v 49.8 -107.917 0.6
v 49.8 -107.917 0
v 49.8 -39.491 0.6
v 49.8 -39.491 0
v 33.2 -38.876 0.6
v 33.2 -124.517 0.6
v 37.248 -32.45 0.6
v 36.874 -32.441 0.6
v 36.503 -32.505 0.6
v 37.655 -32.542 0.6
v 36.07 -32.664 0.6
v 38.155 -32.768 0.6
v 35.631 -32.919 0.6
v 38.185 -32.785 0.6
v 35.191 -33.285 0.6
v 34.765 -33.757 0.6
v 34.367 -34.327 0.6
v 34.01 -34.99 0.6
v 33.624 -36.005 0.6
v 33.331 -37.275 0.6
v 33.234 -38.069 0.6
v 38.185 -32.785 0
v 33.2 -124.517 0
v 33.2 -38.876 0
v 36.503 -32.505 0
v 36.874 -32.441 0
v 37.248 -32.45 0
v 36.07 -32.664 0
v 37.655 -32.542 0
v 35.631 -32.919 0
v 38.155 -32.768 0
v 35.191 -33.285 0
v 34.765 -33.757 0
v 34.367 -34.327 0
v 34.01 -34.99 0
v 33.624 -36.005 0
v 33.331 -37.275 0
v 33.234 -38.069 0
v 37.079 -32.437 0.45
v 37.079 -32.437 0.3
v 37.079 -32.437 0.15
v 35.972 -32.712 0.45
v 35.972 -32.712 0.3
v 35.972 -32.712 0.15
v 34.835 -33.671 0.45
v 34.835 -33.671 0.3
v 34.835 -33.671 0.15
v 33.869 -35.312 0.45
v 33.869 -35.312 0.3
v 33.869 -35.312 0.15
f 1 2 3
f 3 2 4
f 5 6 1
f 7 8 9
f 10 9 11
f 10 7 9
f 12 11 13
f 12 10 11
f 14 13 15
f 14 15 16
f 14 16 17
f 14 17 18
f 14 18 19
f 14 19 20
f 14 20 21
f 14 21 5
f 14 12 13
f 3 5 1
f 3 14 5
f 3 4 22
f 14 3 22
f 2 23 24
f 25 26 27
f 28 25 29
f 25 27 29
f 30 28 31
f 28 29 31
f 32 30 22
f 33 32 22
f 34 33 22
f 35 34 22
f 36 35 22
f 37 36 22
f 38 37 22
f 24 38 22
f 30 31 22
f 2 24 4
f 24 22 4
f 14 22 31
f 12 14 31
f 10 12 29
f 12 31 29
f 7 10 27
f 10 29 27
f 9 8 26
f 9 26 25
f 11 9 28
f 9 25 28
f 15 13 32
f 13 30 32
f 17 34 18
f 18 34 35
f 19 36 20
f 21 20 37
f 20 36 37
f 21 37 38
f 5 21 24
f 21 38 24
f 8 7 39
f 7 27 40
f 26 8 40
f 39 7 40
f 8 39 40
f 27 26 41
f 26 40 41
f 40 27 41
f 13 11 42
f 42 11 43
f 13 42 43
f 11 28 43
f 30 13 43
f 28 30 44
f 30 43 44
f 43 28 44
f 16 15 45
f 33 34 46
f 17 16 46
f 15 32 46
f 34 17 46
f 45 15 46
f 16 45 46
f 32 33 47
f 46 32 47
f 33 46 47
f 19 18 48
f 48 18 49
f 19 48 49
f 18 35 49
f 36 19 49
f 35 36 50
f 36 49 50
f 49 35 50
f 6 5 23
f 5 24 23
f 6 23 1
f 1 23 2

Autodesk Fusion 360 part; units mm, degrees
sketch "Sketch1" plane through (0, 0, 0) normal (0, 0, 1) x (1, 0, 0)
  line L0 (50, -108) -> (50, -39.3754)
  line L1 (50, -39.3754) -> (38.2856, -32.6121)
  spline S0 degree 3 poles (38.2856, -32.6121) (37.4771, -32.1422) (36.6924, -32.1202) (35.8815, -32.5337) (35.0622, -32.9516) (34.2278, -33.9044) (33.6842, -35.2367) (33.2499, -36.3014) (33.0037, -37.5868) (33, -38.8754) knots -0.361367 -0.361367 -0.361367 -0.361367 0.324344 0.324344 0.324344 1.017159 1.017159 1.017159 1.570796 1.570796 1.570796 1.570796
  line L2 (33, -38.8754) -> (33, -125)
  line L3 (33, -125) -> (50, -108)
  line L4 (49.8, -107.9172) -> (49.8, -39.4909)
  line L5 (49.8, -39.4909) -> (38.1854, -32.7852)
  spline S1 degree 3 poles (38.1854, -32.7852) (38.1853, -32.7851) (38.1852, -32.7851) (38.1851, -32.785) (37.4228, -32.342) (36.7342, -32.3234) (35.9723, -32.7119) (35.2137, -33.0988) (34.3985, -34.0153) (33.8694, -35.3123) (33.4463, -36.3493) (33.2036, -37.6124) (33.2, -38.876) knots -0.361437 -0.361437 -0.361437 -0.361437 -0.361367 -0.361367 -0.361367 0.324344 0.324344 0.324344 1.017159 1.017159 1.017159 1.570796 1.570796 1.570796 1.570796
  line L6 (33.2, -38.876) -> (33.2, -124.5172)
  line L7 (33.2, -124.5172) -> (49.8, -107.9172)
  dimension "d1" = 45
  dimension "d2" = 17
  dimension "d3" = 33
  dimension "d4" = 125
  dimension "d5" = 120
  dimension "d6" = 0.5
  dimension "d7" = -0.2
extrude "Extrude1" add sketch "Sketch1" along normal blind 0.6 contours L4 L5 S1 L6 L7
